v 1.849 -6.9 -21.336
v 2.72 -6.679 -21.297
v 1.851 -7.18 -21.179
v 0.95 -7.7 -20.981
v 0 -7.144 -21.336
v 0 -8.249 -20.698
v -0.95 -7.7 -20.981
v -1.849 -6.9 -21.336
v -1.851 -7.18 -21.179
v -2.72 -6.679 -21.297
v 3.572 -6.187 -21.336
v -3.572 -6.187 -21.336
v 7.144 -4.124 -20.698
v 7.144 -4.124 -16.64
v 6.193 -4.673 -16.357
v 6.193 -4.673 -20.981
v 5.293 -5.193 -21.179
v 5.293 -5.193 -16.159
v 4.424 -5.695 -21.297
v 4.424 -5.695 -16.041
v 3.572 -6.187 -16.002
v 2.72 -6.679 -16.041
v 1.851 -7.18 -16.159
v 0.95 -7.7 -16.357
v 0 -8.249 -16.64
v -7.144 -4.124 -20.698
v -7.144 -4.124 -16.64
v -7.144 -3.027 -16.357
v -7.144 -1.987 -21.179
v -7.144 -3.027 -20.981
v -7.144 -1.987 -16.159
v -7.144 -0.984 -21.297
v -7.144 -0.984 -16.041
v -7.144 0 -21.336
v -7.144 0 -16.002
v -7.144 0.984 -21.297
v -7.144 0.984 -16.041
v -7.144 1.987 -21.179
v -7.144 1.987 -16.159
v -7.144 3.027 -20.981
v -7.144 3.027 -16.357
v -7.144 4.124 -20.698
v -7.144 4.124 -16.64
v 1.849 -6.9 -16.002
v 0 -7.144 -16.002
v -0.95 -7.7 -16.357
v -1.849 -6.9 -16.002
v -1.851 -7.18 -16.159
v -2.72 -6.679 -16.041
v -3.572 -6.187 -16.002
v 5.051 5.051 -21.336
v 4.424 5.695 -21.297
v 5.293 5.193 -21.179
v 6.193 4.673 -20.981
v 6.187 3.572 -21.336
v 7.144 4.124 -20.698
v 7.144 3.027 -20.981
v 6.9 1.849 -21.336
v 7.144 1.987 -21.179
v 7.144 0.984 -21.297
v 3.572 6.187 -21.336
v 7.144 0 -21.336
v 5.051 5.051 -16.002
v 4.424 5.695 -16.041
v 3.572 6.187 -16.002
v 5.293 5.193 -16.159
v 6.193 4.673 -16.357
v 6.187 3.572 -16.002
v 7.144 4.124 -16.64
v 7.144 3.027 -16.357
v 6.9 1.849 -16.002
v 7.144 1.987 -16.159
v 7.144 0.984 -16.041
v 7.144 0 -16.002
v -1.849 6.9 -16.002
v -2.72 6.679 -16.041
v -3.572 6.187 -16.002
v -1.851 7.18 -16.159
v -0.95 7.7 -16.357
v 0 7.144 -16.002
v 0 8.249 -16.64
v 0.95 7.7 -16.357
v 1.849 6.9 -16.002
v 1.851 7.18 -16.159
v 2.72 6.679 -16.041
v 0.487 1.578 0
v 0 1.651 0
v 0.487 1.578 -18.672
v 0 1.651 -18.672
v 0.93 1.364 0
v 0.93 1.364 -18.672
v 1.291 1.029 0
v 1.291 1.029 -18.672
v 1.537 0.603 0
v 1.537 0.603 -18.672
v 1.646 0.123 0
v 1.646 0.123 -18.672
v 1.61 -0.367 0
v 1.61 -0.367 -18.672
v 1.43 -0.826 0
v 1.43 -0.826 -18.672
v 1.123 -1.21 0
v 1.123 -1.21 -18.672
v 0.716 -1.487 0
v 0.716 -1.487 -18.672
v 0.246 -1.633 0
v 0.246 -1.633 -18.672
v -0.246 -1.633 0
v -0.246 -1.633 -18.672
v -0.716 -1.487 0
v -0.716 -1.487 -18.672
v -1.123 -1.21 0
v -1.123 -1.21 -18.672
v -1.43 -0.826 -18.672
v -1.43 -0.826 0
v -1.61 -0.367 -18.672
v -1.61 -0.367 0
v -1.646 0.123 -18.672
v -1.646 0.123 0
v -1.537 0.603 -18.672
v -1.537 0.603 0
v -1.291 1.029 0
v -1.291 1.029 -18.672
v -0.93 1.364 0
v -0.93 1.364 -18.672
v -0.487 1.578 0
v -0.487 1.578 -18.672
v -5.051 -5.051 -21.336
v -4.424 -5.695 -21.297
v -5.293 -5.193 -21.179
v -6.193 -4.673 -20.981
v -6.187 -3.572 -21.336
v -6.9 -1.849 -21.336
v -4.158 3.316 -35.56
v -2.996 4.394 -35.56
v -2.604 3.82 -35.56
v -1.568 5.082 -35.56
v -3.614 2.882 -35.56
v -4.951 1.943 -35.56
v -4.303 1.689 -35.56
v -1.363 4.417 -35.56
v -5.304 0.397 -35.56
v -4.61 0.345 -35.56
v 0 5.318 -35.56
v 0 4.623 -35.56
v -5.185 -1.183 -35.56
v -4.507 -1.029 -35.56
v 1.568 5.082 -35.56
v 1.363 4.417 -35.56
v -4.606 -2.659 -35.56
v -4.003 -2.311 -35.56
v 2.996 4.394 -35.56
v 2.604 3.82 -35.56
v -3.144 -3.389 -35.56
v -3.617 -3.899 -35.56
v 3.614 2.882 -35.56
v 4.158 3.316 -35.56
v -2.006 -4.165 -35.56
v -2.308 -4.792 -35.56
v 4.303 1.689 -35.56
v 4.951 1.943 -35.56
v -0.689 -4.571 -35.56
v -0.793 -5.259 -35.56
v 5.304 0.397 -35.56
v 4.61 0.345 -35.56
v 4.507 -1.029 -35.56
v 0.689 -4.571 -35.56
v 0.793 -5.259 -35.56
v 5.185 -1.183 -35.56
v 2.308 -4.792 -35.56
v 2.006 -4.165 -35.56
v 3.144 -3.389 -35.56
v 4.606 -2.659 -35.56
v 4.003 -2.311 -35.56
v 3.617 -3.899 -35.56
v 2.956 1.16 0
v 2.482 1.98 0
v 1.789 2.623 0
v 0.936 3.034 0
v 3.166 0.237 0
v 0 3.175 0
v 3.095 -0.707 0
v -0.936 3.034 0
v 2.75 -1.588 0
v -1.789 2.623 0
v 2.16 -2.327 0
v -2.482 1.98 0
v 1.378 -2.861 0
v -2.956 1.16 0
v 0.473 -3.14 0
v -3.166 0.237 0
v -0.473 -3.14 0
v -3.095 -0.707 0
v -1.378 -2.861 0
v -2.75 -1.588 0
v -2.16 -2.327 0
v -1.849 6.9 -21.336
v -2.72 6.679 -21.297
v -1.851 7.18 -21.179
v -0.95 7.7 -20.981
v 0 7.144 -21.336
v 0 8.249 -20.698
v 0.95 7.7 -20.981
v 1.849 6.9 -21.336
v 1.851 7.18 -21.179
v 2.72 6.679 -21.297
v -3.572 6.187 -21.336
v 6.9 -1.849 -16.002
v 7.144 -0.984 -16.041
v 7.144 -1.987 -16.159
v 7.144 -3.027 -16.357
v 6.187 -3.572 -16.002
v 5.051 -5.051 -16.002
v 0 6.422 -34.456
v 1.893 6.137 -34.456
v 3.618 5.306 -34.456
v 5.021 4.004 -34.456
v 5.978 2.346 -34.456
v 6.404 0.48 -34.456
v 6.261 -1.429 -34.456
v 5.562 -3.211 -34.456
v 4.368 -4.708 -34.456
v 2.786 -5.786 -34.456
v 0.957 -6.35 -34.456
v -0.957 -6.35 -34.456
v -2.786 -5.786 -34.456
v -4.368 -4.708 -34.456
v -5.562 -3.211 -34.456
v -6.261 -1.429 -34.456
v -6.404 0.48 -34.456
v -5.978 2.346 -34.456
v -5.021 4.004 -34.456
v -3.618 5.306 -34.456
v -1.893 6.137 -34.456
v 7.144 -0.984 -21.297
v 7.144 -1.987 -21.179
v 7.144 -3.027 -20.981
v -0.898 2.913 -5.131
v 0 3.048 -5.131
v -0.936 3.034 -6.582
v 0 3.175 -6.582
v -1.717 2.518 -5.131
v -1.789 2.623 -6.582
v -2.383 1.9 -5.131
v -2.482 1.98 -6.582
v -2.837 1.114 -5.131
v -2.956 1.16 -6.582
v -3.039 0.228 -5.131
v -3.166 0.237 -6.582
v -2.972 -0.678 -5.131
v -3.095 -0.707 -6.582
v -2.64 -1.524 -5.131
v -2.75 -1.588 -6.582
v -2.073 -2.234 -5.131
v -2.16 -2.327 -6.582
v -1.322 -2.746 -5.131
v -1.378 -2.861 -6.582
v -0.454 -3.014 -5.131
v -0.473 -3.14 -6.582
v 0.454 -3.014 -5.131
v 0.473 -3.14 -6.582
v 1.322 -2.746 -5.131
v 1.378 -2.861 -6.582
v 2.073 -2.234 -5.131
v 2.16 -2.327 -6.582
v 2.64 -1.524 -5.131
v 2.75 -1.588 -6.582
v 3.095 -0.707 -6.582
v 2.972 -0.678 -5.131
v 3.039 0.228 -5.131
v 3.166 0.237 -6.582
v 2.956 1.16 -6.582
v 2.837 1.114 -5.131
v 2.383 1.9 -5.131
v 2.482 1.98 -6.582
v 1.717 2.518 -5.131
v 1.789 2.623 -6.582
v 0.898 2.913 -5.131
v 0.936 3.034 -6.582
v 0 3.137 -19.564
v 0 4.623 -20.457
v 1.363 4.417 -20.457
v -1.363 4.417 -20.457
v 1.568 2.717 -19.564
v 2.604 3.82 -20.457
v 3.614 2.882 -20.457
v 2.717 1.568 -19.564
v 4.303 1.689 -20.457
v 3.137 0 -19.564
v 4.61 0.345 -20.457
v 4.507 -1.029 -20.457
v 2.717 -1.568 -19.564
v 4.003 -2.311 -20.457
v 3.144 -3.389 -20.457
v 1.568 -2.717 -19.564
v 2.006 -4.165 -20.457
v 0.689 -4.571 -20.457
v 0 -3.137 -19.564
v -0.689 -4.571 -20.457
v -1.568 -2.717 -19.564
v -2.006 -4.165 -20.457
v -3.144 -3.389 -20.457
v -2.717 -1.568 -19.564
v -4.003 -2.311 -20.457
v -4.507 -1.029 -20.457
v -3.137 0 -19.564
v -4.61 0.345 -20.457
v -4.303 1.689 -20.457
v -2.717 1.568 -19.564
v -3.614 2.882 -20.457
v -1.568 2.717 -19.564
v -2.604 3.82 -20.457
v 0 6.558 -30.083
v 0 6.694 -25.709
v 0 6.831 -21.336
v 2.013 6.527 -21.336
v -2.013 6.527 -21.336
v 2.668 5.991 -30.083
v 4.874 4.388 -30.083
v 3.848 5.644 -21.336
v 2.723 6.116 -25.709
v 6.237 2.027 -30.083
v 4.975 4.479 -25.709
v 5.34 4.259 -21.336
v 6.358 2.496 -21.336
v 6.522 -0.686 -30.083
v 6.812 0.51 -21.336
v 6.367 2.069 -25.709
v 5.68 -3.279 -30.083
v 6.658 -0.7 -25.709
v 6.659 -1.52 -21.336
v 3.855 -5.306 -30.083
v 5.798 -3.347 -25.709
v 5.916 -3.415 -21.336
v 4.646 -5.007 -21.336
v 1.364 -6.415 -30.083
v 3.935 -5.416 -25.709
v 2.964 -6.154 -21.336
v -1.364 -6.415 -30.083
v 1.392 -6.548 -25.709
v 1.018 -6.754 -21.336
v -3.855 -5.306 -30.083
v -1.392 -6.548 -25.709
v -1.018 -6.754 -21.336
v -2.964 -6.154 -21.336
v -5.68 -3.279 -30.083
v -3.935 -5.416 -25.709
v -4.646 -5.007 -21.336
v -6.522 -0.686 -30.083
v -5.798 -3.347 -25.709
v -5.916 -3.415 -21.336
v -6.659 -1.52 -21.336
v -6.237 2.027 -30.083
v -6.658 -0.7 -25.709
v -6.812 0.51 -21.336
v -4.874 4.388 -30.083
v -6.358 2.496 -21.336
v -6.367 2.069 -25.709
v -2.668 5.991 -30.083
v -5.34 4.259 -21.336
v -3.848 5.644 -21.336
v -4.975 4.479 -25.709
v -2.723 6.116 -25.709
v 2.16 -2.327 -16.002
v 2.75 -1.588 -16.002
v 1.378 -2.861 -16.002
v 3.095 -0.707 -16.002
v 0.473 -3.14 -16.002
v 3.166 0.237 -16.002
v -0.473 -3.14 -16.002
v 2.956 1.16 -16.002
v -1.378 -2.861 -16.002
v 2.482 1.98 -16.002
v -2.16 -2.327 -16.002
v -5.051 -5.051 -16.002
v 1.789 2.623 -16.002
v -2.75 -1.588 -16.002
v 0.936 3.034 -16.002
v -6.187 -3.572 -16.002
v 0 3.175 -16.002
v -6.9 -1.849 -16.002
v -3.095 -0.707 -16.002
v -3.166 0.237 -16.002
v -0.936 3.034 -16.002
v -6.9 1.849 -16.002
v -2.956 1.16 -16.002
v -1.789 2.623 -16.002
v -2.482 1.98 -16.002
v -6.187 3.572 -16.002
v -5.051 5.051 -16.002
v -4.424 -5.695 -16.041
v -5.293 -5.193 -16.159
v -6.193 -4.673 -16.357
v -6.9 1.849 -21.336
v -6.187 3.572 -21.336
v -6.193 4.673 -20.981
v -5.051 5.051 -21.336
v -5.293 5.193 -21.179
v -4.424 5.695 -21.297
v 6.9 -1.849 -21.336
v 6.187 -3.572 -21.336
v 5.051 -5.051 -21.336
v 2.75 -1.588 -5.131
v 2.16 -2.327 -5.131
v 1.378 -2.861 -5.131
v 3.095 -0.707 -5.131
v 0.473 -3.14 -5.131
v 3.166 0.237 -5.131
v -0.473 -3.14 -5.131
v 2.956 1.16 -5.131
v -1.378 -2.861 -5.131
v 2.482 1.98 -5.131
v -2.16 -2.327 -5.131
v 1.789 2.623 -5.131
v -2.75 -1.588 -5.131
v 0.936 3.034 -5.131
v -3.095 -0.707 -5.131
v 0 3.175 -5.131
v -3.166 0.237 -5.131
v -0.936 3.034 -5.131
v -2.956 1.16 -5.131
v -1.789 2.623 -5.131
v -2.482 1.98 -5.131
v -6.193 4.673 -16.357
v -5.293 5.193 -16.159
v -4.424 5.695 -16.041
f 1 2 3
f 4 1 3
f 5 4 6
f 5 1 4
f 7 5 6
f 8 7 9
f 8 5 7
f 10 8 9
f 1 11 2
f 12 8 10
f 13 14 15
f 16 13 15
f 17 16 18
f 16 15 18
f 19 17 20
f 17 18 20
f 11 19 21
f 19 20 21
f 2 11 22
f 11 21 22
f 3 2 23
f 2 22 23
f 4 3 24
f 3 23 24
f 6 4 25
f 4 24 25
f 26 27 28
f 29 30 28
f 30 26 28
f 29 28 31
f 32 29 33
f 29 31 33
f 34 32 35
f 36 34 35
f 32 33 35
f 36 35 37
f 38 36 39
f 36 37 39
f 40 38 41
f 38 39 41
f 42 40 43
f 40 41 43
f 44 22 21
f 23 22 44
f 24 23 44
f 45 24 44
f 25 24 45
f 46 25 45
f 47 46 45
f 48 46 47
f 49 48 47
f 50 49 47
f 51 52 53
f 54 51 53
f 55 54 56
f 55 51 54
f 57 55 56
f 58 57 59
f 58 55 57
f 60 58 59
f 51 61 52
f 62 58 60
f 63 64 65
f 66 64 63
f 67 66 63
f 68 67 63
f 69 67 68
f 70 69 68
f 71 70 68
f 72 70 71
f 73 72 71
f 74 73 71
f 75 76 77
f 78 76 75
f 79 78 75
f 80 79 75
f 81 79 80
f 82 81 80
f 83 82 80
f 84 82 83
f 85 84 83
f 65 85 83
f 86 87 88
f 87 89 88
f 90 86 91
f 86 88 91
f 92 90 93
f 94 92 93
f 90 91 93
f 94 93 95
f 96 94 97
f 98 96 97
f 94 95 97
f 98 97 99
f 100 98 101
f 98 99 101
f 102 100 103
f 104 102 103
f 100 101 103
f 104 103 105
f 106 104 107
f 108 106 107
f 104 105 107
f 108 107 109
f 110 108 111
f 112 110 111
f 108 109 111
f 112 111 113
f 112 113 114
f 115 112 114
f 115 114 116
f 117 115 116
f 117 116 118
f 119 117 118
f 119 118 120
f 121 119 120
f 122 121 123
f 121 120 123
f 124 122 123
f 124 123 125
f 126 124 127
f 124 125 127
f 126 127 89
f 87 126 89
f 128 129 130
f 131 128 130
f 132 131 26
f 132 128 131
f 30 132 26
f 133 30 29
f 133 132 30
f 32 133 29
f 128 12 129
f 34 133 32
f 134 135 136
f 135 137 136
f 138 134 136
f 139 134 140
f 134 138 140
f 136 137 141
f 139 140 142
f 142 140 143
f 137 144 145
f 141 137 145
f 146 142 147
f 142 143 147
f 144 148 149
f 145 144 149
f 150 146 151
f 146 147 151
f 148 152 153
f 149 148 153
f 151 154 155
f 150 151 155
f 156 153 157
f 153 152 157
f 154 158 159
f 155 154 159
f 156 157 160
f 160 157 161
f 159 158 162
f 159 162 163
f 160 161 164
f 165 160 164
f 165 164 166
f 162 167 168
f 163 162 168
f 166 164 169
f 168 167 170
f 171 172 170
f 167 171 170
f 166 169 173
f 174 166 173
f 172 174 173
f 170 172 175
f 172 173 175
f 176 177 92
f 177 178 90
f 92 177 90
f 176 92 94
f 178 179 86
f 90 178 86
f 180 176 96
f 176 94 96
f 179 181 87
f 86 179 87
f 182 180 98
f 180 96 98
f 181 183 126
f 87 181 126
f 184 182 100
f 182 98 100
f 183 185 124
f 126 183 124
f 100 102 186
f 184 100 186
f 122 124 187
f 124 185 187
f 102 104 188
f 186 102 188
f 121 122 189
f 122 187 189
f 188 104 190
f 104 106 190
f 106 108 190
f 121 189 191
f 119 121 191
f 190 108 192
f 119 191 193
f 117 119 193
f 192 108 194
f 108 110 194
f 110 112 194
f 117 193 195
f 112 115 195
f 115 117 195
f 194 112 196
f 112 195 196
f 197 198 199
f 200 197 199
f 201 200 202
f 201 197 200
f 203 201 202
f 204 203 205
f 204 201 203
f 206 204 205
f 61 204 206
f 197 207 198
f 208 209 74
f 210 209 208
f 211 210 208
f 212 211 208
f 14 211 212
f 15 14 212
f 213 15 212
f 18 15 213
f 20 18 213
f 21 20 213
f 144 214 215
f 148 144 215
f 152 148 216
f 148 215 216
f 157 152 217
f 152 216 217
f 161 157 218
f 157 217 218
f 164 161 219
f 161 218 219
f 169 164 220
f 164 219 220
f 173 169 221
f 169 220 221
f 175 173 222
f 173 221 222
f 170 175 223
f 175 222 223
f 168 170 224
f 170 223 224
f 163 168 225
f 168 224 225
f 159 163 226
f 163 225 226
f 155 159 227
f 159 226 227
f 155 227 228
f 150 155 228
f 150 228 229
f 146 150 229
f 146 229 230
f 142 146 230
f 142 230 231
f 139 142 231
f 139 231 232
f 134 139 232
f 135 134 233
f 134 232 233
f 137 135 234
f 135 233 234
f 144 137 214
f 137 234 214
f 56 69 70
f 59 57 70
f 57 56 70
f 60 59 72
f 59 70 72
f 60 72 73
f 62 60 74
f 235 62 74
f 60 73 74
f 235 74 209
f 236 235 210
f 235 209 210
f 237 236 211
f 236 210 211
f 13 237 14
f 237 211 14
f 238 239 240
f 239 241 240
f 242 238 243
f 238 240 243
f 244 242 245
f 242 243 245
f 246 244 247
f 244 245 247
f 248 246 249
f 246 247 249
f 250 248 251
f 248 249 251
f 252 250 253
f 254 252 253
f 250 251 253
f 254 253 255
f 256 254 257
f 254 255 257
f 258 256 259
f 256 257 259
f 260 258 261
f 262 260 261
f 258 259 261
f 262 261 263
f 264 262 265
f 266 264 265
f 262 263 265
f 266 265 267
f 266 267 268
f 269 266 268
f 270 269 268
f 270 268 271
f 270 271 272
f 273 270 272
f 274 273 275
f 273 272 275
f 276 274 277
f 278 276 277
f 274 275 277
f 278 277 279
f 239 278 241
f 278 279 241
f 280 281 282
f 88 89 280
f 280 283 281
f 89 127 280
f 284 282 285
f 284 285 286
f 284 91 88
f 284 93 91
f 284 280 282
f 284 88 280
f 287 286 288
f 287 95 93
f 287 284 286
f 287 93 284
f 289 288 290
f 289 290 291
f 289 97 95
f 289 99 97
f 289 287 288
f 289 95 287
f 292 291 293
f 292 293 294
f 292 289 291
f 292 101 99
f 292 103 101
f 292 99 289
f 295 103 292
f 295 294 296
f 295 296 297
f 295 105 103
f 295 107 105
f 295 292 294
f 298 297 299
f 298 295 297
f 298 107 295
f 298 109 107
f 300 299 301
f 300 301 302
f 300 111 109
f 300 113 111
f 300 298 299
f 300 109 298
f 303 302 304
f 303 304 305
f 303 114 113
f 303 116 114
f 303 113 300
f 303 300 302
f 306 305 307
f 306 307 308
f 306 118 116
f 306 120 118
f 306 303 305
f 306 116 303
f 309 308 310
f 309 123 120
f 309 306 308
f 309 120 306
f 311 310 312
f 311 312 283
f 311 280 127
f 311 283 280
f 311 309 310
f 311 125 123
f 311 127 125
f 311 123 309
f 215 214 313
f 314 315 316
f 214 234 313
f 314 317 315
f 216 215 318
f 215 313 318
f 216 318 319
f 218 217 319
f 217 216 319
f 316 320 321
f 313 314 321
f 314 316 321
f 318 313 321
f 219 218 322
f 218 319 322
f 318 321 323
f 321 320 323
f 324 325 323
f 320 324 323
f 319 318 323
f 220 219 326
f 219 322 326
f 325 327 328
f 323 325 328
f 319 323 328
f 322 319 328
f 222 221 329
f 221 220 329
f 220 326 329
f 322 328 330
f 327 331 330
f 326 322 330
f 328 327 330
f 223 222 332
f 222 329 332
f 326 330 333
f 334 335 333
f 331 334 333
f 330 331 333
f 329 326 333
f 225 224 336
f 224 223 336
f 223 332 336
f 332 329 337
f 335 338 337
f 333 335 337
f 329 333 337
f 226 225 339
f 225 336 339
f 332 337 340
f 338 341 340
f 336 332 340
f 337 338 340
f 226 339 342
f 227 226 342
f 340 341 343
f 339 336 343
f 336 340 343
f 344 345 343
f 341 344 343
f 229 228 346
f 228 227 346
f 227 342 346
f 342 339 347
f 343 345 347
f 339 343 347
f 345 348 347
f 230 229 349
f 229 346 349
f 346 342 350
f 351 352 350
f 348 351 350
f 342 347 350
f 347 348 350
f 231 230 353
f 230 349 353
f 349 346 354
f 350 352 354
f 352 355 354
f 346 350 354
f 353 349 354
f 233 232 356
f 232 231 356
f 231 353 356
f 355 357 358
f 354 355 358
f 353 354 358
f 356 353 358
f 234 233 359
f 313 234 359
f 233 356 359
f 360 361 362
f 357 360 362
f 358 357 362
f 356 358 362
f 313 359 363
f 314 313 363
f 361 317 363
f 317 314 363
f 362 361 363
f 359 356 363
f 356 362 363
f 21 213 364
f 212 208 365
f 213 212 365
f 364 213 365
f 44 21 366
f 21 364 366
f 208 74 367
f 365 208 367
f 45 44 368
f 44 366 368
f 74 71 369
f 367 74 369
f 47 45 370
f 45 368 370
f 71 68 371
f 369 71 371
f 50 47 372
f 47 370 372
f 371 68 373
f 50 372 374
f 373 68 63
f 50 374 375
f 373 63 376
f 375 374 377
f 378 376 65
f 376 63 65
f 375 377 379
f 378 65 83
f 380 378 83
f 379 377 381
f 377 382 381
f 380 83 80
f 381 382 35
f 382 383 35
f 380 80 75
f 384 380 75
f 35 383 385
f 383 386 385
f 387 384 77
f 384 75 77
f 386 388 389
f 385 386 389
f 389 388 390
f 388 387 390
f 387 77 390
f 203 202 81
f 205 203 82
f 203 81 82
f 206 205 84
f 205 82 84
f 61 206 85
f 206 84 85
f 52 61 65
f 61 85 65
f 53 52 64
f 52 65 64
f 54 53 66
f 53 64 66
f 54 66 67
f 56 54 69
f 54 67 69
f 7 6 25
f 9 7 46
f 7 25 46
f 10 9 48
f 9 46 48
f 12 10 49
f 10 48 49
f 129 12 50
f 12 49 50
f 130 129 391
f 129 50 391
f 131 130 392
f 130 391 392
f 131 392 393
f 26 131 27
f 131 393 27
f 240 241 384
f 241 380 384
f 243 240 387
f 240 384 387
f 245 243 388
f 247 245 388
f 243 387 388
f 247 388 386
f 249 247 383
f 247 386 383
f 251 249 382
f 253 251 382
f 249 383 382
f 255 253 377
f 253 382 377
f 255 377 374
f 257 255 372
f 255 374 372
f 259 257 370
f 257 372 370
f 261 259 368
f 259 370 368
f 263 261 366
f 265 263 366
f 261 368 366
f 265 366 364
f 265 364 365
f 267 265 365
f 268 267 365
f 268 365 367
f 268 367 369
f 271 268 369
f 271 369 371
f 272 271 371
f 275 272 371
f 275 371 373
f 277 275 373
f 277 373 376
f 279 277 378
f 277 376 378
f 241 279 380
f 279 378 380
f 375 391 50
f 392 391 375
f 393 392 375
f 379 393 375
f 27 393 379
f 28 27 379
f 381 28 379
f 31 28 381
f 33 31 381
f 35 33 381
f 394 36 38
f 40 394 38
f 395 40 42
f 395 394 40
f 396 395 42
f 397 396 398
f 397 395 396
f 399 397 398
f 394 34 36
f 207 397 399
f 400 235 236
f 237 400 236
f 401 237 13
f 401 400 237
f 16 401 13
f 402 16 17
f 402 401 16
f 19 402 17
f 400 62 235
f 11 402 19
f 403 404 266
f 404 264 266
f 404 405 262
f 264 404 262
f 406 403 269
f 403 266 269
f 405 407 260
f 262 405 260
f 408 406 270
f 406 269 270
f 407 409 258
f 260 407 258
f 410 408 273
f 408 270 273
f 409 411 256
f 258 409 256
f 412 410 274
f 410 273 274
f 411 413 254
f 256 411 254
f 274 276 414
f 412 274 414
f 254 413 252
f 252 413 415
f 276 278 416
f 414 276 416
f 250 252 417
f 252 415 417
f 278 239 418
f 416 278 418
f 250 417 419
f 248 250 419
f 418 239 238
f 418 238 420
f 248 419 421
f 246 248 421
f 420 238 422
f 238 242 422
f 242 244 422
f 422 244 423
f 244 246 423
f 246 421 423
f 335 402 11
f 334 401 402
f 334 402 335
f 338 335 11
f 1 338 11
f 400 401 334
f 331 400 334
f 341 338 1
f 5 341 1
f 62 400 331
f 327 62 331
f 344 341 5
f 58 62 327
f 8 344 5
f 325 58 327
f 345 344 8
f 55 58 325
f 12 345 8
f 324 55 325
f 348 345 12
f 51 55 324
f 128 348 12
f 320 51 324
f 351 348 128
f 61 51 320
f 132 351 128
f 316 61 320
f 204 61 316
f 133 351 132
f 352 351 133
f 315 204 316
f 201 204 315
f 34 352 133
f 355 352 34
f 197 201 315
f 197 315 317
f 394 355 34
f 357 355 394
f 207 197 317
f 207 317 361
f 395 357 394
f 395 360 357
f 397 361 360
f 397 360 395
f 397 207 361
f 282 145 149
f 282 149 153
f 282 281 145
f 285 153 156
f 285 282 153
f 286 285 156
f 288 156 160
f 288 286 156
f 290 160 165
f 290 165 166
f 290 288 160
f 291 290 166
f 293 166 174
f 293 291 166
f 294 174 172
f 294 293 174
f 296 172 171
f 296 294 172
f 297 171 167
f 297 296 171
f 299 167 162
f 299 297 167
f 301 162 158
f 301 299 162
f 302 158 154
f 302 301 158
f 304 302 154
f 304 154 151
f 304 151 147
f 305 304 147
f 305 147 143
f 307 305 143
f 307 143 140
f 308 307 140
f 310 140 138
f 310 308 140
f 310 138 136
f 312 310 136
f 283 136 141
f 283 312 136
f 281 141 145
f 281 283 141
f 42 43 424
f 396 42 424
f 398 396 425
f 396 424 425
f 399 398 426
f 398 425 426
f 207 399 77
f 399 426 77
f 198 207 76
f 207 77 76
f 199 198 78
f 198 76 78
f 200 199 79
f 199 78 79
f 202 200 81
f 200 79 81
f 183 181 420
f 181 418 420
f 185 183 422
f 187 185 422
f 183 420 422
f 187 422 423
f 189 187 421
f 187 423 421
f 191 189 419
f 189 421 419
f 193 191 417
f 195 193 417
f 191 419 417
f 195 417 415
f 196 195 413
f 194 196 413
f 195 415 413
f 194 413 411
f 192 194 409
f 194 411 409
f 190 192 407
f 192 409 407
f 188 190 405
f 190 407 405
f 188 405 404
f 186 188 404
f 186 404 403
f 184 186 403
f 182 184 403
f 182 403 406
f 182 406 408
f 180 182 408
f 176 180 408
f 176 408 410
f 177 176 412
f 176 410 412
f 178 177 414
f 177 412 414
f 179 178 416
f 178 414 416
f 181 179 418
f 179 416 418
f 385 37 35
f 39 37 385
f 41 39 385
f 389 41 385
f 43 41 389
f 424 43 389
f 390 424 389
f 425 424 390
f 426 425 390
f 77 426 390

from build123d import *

# Parameters (mm, degrees)
BOSS_EXTRUDE1_DEPTH = 5.334
SKETCH4_W           = 21.336
SKETCH4_H           = 1.651


with BuildPart() as part:
    # Sketch2 → Revolve1 (revolve)
    with BuildSketch(Plane(origin=(0, 0, 0), x_dir=(0, 0, -1), z_dir=(1, 0, 0))):
        Polygon((5.1308, 3.175), (5.1308, 3.048), (6.582416642, 3.175), (16.002, 3.175), (16.002, 0), (0, 0), (0, 3.175), align=None)
    revolve(axis=Axis((0, 0, -16.002), (0, 0, 1)))

    # Sketch3 → Boss-Extrude1 (add)
    with BuildSketch(Plane(origin=(0, 0, -16.002), x_dir=(-1, 0, 0), z_dir=(0, 0, -1))):
        Polygon((0, 8.248891971), (-7.14375, 4.124445986), (-7.14375, -4.124445986), (0, -8.248891971), (7.14375, -4.124445986), (7.14375, 4.124445986), align=None)
    extrude(amount=BOSS_EXTRUDE1_DEPTH)

    # Sketch4 → Cut-Revolve1 (revolve, cut)
    with BuildSketch(Plane(origin=(0, 0, 0), x_dir=(0, 0, -1), z_dir=(1, 0, 0))):
        Polygon((16.002, 8.248891971), (16.002, 7.14375), (16.640054014, 8.248891971), (20.697945986, 8.248891971), (21.336, 7.14375), (21.336, 8.248891971), (21.336, 9.354033942), (16.002, 9.354033942), align=None)
        with Locations((10.668, 0.8255)):
            Rectangle(SKETCH4_W, SKETCH4_H)
    revolve(axis=Axis((0, 0, 0), (0, 0, -1)), mode=Mode.SUBTRACT)


with BuildPart() as body_2:
    # Sketch5 → Revolve2 (revolve)
    with BuildSketch(Plane(origin=(0, 0, 0), x_dir=(0, 0, -1), z_dir=(1, 0, 0))):
        Polygon((20.45716, 0), (35.56, 0), (35.56, 6.38777167), (20.45716, 6.858), align=None)
    revolve(axis=Axis((0, 0, -20.45716), (0, 0, -1)))


with BuildPart() as part_1:
    add(part.part)

    # Combine1: union body 2
    add(body_2.part)

    # Sketch8 → Cut-Revolve2 (revolve, cut)
    with BuildSketch(Plane(origin=(0, 0, 0), x_dir=(0, 0, -1), z_dir=(1, 0, 0))):
        Polygon((35.56, 5.318470859), (34.33794193, 6.540528929), (35.56, 6.540528929), align=None)
        Polygon((35.56, 4.6228), (20.45716, 4.6228), (17.67950153, 0), (35.56, 0), align=None)
    revolve(axis=Axis((0, 0, 0), (0, 0, -1)), mode=Mode.SUBTRACT)


solid = part_1.part
